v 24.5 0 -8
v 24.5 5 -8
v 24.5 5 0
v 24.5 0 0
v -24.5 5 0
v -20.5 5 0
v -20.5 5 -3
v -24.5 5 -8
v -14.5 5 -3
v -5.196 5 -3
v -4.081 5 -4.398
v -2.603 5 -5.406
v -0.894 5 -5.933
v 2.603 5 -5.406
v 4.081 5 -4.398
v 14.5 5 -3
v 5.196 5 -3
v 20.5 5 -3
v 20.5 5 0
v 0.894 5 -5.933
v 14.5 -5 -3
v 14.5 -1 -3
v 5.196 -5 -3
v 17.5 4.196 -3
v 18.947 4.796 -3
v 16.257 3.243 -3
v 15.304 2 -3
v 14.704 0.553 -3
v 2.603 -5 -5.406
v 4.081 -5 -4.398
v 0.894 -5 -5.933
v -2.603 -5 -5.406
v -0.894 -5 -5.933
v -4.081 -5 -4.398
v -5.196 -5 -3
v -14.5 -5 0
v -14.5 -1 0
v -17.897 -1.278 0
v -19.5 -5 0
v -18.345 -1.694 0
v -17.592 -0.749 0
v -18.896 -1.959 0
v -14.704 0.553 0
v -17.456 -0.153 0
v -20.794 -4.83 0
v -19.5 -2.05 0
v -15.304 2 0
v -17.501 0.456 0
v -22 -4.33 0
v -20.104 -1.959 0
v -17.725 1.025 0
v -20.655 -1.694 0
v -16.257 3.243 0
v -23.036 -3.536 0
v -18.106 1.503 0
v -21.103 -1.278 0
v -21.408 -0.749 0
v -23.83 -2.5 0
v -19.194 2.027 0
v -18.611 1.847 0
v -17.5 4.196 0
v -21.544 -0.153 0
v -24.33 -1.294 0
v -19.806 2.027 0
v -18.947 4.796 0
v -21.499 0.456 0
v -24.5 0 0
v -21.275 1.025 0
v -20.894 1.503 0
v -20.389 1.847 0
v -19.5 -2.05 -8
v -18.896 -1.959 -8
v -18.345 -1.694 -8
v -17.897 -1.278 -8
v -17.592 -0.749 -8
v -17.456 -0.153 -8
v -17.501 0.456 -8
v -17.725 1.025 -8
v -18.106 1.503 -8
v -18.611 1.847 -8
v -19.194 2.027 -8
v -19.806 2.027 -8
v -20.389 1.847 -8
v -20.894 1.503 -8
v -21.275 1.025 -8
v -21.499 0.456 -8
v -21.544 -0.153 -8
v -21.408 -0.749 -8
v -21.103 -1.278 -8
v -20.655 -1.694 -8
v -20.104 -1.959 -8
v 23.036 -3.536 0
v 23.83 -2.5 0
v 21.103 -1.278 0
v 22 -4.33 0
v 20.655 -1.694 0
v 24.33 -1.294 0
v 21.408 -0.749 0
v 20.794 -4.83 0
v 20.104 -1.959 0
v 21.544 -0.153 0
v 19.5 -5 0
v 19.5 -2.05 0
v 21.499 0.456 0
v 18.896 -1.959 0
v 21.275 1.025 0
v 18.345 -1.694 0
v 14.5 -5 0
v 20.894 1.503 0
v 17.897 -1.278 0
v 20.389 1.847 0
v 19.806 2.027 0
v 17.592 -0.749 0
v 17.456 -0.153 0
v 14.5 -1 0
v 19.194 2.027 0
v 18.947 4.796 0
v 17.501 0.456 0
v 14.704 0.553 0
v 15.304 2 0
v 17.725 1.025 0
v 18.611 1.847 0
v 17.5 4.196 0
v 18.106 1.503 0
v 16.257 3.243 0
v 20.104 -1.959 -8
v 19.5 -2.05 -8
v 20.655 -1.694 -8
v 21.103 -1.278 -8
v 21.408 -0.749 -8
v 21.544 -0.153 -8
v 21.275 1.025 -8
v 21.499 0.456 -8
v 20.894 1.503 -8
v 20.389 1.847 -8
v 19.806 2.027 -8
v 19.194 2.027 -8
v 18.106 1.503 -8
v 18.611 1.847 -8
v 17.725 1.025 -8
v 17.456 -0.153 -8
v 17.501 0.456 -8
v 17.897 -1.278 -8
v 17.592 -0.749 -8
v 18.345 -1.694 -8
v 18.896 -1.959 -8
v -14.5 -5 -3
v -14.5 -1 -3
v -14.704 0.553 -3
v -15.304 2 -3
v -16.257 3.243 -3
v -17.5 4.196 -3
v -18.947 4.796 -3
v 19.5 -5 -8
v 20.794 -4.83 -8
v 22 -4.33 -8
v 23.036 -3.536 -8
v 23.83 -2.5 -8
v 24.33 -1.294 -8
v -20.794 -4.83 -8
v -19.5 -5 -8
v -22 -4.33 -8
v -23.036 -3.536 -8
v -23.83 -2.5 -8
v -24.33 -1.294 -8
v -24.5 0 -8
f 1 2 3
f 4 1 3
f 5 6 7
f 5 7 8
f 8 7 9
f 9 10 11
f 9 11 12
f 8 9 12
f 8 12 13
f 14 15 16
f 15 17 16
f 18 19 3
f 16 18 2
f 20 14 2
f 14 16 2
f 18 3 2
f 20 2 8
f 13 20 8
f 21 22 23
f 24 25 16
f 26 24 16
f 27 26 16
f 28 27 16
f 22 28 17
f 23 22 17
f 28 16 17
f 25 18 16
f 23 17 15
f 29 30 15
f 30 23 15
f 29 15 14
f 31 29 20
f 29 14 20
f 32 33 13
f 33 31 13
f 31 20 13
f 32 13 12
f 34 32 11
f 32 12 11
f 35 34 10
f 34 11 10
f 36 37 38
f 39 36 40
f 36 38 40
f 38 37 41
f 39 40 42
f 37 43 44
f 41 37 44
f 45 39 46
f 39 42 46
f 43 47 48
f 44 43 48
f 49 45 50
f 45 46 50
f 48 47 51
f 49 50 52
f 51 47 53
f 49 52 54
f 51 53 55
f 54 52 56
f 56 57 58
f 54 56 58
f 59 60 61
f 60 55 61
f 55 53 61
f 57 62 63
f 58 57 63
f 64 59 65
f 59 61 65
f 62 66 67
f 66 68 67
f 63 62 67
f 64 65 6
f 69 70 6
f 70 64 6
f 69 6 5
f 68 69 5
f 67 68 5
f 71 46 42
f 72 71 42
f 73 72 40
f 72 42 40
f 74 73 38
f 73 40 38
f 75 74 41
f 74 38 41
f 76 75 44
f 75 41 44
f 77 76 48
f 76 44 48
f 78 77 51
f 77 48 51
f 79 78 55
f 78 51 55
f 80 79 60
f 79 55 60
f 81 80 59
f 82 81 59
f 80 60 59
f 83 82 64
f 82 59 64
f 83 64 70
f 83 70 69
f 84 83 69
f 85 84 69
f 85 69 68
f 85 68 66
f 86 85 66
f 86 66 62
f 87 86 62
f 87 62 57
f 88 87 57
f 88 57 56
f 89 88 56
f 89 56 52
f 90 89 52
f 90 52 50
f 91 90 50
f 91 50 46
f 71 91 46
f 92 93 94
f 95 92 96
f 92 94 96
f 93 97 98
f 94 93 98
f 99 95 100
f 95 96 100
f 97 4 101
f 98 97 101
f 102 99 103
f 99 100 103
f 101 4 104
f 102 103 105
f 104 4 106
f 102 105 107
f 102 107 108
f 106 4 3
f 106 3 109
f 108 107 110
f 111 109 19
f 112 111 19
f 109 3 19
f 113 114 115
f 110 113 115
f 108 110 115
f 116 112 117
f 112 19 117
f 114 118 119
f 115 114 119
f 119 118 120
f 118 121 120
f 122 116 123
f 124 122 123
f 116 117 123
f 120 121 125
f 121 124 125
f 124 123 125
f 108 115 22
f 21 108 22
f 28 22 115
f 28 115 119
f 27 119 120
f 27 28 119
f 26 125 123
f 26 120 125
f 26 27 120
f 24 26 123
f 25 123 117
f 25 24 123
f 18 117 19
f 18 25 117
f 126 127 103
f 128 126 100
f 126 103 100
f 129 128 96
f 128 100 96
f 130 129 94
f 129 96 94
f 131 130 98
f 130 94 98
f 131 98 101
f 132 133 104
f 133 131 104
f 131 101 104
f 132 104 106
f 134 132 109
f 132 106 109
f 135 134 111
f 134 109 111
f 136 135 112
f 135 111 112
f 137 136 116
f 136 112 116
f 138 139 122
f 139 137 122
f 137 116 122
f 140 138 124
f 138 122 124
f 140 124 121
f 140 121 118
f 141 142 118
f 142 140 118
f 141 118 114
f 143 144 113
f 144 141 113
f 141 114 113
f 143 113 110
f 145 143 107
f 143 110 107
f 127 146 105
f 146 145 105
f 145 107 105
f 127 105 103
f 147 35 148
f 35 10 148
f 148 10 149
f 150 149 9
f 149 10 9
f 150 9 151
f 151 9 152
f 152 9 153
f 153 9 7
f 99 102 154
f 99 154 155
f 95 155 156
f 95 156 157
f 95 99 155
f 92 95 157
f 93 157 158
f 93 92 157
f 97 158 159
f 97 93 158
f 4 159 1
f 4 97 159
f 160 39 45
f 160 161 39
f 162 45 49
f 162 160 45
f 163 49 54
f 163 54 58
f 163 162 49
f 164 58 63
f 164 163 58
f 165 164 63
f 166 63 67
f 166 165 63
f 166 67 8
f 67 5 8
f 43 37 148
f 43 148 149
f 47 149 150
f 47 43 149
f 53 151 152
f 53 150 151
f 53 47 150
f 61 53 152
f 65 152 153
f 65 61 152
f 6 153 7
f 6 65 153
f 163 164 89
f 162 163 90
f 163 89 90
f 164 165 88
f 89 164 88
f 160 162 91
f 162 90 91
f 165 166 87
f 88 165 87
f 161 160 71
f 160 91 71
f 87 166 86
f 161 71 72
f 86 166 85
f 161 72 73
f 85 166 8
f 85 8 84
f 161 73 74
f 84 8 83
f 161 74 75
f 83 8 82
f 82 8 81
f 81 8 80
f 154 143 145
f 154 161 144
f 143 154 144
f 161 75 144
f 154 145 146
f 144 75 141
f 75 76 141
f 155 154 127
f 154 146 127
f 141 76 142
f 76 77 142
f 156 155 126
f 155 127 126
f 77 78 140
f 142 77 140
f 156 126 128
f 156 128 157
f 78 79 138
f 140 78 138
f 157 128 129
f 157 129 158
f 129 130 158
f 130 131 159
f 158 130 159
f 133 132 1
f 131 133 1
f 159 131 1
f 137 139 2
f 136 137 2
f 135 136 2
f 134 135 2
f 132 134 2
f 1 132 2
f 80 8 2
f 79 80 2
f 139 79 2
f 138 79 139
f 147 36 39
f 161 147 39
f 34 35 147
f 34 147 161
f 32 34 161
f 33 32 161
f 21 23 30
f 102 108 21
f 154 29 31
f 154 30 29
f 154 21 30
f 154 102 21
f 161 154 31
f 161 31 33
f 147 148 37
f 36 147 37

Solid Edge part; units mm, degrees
sketch "Sketch1" plane through (0, 0, 0) normal (0, -1, 0) x (1, 0, 0)
  line L0 (-24.5, 0) -> (-24.5, -8)
  line L1 (-24.5, -8) -> (24.5, -8)
  line L2 (24.5, -8) -> (24.5, 0)
  line L3 (24.5, 0) -> (14.5, 0)
  line L4 (14.5, 0) -> (14.5, -3)
  line L5 (14.5, -3) -> (-14.5, -3)
  line L6 (-14.5, -3) -> (-14.5, 0)
  line L7 (-14.5, 0) -> (-24.5, 0)
  dimension "D1" = 29
  dimension "D2" = 49
  dimension "D3" = 5
  dimension "D4" = 10
  dimension "D5" = 3
  dimension "D6" = 8
  dimension "D7" = 14.5
  dimension "D8" = 24.5
extrude "Ajout_matière_1" add sketch "Sketch1" along normal mid plane 10
sketch "Sketch2" plane through (0, 0, 0) normal (0, -1, 0) x (1, 0, 0)
  circle A0 centre (0, 0) radius 6
extrude "Cutout1" cut sketch "Sketch2" along normal mid plane 10
hole "Perçage_1" at (-19.5, 0, 0) direction (0, 0, -1) diameter 4.1 end up to next
mirror "Mirror1" about plane through (0, 0, 0) normal (1, 0, 0) of "Perçage_1"
fillet "Congé_1" radius 6 2 edges at (-14.5, 5, -1.5) (14.5, 5, -1.5)
fillet "Congé_2" radius 5 2 edges at (-24.5, -5, -4) (24.5, -5, -4)
properties material "Plastique ABS, performance moyenne"
